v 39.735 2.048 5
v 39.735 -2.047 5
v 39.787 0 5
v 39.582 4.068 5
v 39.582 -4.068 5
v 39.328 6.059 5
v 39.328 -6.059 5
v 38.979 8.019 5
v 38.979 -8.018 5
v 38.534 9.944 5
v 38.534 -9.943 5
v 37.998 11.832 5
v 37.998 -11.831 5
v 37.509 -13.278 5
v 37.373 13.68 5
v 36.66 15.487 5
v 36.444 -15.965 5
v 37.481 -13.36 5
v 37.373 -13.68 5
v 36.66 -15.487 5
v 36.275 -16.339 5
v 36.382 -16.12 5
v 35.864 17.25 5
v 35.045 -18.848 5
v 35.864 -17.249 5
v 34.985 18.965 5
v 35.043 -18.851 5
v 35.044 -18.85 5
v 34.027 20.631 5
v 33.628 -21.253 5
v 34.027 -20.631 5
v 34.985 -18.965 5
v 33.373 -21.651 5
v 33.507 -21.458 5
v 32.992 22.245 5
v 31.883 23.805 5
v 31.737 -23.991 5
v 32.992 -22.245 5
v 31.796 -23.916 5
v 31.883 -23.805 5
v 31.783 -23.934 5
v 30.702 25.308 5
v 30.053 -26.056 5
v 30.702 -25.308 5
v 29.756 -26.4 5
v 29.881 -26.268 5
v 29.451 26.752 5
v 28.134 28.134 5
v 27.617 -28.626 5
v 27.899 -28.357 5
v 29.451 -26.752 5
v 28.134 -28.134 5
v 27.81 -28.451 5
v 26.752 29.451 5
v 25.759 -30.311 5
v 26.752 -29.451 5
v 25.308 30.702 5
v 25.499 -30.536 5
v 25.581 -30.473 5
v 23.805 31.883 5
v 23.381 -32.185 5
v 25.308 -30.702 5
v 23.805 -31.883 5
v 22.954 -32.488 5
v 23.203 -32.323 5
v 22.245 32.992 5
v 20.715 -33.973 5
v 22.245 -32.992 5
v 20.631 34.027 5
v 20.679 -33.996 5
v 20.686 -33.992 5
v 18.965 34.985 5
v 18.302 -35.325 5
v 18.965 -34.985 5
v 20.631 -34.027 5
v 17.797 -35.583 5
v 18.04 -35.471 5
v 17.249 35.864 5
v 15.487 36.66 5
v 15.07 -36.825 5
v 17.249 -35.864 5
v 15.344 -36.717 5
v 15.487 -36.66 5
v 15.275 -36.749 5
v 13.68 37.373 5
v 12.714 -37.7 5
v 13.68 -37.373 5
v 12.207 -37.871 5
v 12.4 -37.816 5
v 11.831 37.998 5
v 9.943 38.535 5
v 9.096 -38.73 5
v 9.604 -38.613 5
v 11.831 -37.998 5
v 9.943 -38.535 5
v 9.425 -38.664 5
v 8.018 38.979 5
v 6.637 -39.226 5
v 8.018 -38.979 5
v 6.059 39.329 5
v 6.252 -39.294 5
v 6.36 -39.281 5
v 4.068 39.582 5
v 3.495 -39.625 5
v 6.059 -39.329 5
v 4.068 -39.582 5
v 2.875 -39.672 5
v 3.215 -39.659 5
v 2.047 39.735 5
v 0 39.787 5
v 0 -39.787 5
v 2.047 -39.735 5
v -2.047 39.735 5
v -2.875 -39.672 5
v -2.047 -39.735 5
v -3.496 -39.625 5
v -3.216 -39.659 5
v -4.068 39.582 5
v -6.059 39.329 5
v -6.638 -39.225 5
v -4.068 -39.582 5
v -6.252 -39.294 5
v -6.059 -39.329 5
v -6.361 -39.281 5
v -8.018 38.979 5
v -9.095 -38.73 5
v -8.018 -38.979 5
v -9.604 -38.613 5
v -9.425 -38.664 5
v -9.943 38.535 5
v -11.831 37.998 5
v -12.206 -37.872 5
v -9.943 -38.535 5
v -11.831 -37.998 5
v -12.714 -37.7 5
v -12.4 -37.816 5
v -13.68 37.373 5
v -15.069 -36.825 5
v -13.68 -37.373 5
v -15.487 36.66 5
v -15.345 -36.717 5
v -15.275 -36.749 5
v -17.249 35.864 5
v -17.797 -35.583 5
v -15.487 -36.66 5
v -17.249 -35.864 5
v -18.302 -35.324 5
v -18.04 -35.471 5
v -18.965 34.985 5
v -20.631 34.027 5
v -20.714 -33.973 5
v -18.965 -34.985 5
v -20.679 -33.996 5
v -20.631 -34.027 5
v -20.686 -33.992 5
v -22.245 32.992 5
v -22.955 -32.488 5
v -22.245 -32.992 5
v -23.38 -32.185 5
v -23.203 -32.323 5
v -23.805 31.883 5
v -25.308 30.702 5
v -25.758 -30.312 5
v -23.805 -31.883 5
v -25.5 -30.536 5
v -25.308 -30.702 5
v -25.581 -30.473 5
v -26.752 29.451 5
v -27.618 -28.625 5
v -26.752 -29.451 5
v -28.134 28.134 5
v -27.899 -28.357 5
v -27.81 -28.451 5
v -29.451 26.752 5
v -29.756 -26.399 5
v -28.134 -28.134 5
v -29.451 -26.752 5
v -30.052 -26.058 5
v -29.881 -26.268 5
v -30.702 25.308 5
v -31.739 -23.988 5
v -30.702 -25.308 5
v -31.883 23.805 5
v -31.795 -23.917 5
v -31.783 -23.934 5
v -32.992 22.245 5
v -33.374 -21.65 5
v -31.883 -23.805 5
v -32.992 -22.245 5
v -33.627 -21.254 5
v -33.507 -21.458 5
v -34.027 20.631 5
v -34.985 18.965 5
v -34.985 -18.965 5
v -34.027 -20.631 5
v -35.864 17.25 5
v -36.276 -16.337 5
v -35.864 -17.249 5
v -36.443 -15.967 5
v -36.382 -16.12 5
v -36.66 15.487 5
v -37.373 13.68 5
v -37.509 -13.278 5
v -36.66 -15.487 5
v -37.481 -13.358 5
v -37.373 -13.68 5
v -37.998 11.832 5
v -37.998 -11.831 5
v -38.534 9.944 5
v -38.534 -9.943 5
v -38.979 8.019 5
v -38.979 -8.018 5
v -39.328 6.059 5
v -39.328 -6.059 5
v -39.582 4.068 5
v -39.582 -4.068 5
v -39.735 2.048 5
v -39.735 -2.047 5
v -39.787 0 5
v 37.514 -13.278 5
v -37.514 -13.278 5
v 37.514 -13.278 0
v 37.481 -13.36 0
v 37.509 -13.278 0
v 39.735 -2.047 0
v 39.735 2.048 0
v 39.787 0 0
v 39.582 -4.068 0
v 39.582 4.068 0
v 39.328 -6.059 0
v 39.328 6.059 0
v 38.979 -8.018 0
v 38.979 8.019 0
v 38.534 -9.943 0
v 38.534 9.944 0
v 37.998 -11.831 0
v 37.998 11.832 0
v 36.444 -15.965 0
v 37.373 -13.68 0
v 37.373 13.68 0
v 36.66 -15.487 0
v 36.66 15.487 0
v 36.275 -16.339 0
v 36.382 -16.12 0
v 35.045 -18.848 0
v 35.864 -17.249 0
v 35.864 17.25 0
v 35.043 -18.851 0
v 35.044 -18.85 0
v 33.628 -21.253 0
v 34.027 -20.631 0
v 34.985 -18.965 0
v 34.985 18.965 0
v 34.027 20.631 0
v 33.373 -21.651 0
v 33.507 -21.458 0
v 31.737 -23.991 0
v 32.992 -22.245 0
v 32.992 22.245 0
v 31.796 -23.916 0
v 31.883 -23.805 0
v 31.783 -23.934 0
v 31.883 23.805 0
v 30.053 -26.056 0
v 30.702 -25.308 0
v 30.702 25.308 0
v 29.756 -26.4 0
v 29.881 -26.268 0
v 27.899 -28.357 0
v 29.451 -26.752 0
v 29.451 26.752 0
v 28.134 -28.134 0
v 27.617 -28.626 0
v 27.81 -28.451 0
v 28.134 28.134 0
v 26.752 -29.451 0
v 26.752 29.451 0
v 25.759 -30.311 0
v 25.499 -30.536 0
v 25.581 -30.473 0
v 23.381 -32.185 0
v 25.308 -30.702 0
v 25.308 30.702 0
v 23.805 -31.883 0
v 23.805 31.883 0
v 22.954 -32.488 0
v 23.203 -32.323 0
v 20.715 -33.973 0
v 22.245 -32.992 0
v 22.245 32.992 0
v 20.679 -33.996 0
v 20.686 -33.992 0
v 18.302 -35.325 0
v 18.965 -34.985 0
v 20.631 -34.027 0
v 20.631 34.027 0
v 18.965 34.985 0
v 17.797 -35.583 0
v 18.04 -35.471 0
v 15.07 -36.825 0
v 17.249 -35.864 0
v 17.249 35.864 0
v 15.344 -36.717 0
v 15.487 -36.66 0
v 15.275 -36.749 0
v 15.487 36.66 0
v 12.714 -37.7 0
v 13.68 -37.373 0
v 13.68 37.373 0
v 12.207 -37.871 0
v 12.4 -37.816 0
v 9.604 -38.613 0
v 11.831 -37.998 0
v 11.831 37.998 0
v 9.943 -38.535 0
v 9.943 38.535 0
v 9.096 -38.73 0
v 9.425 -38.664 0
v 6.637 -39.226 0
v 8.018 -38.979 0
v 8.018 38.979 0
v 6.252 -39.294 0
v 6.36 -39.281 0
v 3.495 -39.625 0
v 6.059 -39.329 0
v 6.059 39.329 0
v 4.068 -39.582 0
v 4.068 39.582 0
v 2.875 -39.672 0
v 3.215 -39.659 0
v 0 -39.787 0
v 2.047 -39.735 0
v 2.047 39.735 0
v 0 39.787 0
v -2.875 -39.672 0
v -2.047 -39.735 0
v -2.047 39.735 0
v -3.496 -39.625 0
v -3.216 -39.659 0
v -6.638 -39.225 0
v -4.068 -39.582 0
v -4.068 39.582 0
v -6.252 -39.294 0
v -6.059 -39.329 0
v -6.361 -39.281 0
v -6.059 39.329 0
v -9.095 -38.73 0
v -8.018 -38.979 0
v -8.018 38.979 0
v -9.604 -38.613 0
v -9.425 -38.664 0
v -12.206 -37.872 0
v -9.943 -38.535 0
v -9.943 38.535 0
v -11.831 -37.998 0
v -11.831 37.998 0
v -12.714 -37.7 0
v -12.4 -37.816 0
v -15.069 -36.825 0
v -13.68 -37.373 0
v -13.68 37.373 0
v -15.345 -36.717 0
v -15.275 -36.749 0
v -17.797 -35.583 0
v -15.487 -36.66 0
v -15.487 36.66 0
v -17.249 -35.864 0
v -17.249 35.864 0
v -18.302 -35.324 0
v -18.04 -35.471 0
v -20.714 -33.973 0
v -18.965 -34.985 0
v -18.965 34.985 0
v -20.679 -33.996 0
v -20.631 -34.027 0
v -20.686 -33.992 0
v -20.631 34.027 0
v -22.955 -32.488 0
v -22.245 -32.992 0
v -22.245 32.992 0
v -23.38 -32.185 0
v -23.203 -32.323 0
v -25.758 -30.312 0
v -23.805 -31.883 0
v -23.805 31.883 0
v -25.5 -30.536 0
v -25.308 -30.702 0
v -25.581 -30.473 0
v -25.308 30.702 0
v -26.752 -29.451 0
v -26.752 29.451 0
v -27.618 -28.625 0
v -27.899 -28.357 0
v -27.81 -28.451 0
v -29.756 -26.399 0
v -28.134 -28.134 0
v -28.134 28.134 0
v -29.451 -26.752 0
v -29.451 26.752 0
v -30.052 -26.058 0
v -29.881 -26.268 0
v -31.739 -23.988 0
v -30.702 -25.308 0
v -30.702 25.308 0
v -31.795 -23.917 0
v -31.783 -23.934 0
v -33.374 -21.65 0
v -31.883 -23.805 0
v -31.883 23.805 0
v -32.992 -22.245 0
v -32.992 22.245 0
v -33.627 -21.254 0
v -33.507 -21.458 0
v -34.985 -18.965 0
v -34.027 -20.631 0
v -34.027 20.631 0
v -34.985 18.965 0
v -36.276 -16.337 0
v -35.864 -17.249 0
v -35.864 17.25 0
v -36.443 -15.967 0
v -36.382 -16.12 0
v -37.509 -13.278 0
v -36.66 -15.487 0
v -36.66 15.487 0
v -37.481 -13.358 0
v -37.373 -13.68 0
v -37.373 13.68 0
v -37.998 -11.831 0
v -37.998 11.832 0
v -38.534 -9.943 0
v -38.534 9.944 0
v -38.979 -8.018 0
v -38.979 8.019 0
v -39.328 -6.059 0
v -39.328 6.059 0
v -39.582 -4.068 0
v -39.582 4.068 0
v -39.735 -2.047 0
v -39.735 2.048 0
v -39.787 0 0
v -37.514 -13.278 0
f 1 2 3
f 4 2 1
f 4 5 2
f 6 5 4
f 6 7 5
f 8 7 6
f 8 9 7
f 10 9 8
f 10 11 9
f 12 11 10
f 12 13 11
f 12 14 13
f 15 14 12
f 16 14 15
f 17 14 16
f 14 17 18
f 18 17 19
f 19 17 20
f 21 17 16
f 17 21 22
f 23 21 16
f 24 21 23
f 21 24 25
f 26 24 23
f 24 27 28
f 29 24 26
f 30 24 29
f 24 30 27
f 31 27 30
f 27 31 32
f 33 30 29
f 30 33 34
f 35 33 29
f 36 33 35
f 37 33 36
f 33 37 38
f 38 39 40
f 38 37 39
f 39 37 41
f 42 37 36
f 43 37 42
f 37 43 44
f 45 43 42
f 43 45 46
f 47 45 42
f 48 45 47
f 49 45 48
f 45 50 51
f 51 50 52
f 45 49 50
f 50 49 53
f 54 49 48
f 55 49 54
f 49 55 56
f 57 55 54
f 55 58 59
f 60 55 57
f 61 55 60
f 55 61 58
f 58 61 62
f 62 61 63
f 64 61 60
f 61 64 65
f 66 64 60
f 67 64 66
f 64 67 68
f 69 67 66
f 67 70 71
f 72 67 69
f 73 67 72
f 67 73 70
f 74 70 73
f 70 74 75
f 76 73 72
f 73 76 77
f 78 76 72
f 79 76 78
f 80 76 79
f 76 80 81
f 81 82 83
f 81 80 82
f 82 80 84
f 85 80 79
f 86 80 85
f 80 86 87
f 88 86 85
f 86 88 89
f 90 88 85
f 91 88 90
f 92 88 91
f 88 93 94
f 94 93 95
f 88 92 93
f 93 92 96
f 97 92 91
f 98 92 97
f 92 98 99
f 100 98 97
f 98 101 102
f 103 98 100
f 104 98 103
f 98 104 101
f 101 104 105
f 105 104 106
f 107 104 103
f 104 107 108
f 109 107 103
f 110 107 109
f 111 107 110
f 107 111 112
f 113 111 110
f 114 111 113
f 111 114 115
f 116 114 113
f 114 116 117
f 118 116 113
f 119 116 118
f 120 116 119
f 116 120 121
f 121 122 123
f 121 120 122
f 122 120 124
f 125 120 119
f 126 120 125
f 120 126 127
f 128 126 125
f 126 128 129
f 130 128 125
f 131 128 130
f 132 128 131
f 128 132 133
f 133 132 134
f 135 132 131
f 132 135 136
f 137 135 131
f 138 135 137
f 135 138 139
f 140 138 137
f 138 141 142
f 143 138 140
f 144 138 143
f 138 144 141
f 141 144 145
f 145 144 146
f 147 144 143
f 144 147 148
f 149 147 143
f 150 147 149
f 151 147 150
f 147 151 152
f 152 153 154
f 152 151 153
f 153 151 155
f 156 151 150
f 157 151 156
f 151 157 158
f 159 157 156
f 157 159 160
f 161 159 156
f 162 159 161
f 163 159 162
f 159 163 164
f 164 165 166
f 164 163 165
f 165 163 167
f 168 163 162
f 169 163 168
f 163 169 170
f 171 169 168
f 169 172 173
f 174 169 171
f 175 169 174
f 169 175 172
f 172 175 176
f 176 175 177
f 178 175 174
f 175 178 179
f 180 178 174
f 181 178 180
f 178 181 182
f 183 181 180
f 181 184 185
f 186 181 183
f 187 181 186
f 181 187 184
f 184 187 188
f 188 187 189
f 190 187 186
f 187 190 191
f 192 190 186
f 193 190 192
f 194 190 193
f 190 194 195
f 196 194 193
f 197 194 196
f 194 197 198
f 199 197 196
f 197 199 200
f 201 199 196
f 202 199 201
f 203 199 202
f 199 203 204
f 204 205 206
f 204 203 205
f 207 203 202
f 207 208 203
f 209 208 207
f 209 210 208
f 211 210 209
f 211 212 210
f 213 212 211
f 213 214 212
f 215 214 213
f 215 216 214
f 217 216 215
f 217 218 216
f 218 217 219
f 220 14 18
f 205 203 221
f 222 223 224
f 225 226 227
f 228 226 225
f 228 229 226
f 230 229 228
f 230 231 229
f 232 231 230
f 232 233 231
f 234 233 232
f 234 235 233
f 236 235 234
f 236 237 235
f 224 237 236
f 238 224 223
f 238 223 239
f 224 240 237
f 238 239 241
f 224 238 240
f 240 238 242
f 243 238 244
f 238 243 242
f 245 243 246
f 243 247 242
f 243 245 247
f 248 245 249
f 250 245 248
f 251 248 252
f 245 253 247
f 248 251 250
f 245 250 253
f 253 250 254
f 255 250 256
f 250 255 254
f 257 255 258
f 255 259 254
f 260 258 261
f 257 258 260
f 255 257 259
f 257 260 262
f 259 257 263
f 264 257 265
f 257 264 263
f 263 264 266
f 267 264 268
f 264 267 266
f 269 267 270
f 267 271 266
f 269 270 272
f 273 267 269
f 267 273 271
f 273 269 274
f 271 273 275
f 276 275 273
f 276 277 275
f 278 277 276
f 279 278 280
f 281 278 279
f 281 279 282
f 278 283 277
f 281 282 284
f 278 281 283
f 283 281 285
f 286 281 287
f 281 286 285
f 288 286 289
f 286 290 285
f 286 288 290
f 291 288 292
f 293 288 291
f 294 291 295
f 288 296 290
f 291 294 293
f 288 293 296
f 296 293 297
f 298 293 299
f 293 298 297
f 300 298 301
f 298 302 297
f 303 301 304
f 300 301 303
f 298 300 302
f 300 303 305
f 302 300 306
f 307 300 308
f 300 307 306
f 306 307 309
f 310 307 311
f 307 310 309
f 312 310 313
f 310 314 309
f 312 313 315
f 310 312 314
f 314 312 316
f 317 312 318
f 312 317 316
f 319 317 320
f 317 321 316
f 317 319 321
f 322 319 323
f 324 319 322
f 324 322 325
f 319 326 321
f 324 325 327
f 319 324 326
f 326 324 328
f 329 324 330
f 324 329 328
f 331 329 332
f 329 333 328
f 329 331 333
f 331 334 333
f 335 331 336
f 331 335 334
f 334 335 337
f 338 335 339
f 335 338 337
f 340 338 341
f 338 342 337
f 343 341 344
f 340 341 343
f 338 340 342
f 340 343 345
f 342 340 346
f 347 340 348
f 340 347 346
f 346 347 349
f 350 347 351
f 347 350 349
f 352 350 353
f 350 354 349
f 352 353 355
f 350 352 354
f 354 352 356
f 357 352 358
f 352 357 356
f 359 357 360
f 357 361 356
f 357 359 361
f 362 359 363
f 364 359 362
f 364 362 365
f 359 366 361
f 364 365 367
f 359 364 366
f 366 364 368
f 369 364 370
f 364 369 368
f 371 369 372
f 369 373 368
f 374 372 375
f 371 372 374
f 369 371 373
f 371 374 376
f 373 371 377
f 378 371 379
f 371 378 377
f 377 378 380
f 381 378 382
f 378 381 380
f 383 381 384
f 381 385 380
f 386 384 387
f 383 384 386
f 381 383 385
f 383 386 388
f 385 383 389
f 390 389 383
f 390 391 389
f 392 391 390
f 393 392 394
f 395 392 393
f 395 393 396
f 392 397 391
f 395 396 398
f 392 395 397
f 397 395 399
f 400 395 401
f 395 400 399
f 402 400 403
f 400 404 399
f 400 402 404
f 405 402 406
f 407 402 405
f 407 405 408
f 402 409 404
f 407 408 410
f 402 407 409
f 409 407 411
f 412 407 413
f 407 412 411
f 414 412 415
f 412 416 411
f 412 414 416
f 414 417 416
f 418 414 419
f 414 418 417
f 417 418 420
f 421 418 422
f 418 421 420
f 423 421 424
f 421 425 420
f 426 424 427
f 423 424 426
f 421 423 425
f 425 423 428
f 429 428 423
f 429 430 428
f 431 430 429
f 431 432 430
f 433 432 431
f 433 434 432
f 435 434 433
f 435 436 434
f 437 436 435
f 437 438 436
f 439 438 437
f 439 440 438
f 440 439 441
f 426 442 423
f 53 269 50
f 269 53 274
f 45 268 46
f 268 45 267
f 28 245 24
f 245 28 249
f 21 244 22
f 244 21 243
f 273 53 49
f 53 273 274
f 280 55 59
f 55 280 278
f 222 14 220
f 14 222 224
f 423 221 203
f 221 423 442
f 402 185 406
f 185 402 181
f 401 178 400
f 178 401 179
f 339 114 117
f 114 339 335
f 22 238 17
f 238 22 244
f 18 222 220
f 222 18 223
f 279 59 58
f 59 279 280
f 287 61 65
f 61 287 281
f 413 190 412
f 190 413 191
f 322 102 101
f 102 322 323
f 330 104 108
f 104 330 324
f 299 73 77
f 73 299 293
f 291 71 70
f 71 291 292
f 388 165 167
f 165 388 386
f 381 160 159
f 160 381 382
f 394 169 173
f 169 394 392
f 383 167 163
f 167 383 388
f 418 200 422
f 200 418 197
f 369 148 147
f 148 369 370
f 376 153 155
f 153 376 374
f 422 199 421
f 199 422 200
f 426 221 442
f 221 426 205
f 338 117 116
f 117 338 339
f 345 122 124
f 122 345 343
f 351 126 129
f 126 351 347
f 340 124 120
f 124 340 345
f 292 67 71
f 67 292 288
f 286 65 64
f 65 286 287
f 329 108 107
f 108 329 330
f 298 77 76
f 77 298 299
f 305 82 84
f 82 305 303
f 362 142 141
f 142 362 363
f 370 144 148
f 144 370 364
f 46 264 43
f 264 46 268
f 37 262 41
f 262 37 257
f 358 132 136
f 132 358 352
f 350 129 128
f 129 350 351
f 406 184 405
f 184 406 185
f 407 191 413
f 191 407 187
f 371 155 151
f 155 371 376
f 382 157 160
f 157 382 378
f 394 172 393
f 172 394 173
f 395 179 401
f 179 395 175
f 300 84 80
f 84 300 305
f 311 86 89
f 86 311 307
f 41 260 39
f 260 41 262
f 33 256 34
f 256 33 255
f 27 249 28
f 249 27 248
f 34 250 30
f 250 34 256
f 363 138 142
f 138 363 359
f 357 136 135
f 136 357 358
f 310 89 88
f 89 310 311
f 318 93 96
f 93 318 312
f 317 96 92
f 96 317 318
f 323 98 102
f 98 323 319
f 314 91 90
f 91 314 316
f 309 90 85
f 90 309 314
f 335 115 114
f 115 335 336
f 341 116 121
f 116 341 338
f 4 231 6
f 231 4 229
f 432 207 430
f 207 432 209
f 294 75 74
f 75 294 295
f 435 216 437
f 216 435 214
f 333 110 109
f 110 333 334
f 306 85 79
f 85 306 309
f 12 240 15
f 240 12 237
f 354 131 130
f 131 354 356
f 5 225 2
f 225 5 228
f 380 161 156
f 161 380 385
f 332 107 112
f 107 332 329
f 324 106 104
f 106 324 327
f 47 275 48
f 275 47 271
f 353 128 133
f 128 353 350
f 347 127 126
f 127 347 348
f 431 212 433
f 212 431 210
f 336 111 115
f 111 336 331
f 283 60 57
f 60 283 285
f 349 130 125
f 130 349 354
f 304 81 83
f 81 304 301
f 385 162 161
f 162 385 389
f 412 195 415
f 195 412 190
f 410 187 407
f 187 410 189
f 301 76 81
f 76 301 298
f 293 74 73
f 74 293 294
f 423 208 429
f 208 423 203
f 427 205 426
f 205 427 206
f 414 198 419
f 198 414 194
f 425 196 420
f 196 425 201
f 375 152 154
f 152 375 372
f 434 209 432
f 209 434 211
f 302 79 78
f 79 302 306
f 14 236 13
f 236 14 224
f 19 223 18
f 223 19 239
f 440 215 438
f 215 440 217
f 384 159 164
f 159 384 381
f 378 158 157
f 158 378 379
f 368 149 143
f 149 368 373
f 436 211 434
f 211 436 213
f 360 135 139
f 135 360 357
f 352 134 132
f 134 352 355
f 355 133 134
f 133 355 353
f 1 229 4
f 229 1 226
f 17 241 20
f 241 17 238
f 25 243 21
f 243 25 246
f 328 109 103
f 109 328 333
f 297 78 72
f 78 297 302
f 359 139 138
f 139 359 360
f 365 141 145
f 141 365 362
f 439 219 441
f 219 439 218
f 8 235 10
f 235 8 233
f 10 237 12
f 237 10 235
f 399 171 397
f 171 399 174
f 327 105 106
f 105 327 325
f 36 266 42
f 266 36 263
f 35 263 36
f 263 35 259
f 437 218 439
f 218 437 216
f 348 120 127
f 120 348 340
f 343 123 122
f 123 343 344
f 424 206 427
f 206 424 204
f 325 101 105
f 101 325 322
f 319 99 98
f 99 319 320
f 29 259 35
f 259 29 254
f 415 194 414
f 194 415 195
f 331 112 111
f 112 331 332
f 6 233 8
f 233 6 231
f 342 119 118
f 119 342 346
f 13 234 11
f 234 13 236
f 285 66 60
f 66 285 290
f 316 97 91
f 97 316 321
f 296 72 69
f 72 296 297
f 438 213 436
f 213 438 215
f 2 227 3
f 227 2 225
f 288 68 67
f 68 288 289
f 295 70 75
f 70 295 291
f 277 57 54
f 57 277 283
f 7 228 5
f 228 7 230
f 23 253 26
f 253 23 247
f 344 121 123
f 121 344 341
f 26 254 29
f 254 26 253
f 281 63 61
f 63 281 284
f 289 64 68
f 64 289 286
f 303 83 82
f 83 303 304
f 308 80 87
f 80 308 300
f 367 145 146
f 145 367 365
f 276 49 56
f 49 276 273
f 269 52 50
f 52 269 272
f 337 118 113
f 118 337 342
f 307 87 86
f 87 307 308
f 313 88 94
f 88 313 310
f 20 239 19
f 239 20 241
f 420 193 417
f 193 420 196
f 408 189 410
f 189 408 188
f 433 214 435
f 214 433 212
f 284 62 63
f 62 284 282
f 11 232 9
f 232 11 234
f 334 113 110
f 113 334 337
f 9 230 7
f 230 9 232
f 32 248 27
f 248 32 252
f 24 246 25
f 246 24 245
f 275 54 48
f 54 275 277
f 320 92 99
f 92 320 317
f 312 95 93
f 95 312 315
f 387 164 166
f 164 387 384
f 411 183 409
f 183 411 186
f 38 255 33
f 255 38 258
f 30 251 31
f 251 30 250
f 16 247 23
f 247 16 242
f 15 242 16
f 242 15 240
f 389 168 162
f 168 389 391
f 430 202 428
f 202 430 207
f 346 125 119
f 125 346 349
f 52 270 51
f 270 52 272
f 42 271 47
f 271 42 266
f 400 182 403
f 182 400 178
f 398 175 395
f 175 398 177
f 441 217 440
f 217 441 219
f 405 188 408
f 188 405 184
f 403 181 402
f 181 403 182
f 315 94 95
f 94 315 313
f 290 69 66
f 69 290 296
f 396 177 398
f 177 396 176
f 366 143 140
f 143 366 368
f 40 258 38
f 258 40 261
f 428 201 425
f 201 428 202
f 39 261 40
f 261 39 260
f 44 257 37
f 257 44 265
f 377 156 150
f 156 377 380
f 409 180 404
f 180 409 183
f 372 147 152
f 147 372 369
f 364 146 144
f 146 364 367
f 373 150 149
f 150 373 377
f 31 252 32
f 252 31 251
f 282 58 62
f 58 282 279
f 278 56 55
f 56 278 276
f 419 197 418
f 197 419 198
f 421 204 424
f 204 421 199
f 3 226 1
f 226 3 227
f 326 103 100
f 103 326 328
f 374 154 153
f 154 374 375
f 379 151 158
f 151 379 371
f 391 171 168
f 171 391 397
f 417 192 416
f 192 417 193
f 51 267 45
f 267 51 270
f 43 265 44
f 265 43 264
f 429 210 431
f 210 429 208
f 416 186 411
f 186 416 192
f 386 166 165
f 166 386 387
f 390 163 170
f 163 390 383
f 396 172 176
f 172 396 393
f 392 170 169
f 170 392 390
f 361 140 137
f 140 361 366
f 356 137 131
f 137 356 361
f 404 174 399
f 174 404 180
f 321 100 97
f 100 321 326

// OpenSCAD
// Module names are of the form poly_<inkscape-path-id>().
// As a result you can associate a polygon in this OpenSCAD program with the
//  corresponding SVG element in the Inkscape document by looking for 
//  the XML element with the attribute id="inkscape-path-id".

// Paths have their own variables so they can be imported and used 
//  in polygon(points) structures in other programs.
// The NN_points is the list of all polygon XY vertices. 
// There may be an NN_paths variable as well. If it exists then it 
//  defines the nested paths. Both must be used in the 
//  polygon(points, paths) variant of the command.

profile_scale = 25.4/90; //made in inkscape in mm

// helper functions to determine the X,Y dimensions of the profiles
function min_x(shape_points) = min([ for (x = shape_points) min(x[0])]);
function max_x(shape_points) = max([ for (x = shape_points) max(x[0])]);
function min_y(shape_points) = min([ for (x = shape_points) min(x[1])]);
function max_y(shape_points) = max([ for (x = shape_points) max(x[1])]);

height = 5;
width = 1.0;


path59_0_points = [[84.889331,34.643066],[94.123998,34.643066],[94.123998,34.852399],[95.511289,34.554899],[96.678331,33.755399],[97.482873,32.593399],[97.782664,31.208399],[97.782664,15.949733],[97.482873,14.565295],[96.678331,13.403233],[95.511289,12.603421],[94.123998,12.305733],[92.249539,12.120025],[90.509831,11.586566],[88.940373,10.740858],[87.576664,9.618400],[86.454206,8.254691],[85.608498,6.685233],[85.075040,4.945525],[84.889331,3.071067],[84.478132,-5.247410],[83.270735,-13.339688],[81.306444,-21.165786],[78.624561,-28.685724],[75.264388,-35.859522],[71.265230,-42.647198],[66.666388,-49.008773],[61.507165,-54.904265],[55.826864,-60.293695],[49.664788,-65.137083],[43.060239,-69.394447],[36.052520,-73.025807],[28.680934,-75.991182],[20.984783,-78.250593],[13.003371,-79.764058],[4.776000,-80.491598],[-2.108000,-80.491598],[-10.411179,-79.764058],[-18.458937,-78.250593],[-26.212601,-75.991182],[-33.633499,-73.025807],[-40.682960,-69.394447],[-47.322311,-65.137083],[-53.512881,-60.293695],[-59.215999,-54.904265],[-64.392991,-49.008773],[-69.005186,-42.647198],[-73.013912,-35.859522],[-76.380498,-28.685724],[-79.066271,-21.165786],[-81.032560,-13.339688],[-82.240693,-5.247410],[-82.651998,3.071067],[-82.837706,4.945525],[-83.371165,6.685233],[-84.216873,8.254691],[-85.339331,9.618400],[-86.703039,10.740858],[-88.272498,11.586566],[-90.012206,12.120025],[-91.886664,12.305733],[-93.273748,12.603421],[-94.440331,13.403233],[-95.244414,14.565295],[-95.543998,15.949733],[-95.543998,31.208399],[-95.244414,32.593399],[-94.440331,33.755399],[-93.273748,34.554899],[-91.886664,34.852399],[-82.651998,34.852399],[84.889331,34.643066]];

module poly_path59(h, w, res=4)  {
  scale([profile_scale, -profile_scale, 1])
  union()  {
    linear_extrude(height=h)
      polygon(path59_0_points);
  }
}

path53_0_points = [[-132.921863,47.047999],[-128.913328,57.119129],[-124.169830,66.792352],[-118.726031,76.032920],[-112.616593,84.806081],[-105.876179,93.077086],[-98.539450,100.811185],[-90.641069,107.973628],[-82.215698,114.529664],[-73.297999,120.444544],[-63.922633,125.683518],[-54.124264,130.211835],[-43.937553,133.994747],[-33.397162,136.997502],[-22.537754,139.185351],[-11.393990,140.523543],[-0.000533,140.977330],[11.393158,140.523543],[22.537128,139.185351],[33.396714,136.997502],[43.937257,133.994747],[54.124097,130.211835],[63.922574,125.683518],[73.298028,120.444544],[82.215798,114.529664],[90.641224,107.973628],[98.539646,100.811185],[105.876405,93.077086],[112.616839,84.806081],[118.726289,76.032920],[124.170094,66.792352],[128.913594,57.119129],[132.922130,47.047999],[-132.921863,47.047999]];

module poly_path53(h, w, res=4)  {
  scale([profile_scale, -profile_scale, 1])
  union()  {
    linear_extrude(height=h)
      polygon(path53_0_points);
  }
}

path55_0_points = [[-4.308533,-95.515064],[6.544800,-95.515064],[6.544800,-74.424398],[-4.308533,-74.424398],[-4.308533,-95.515064]];

module poly_path55(h, w, res=4)  {
  scale([profile_scale, -profile_scale, 1])
  union()  {
    linear_extrude(height=h)
      polygon(path55_0_points);
  }
}

path69_0_points = [[-15.156533,-101.724397],[17.626133,-101.724397],[17.626133,-89.975064],[-15.156533,-89.975064],[-15.156533,-101.724397]];

module poly_path69(h, w, res=4)  {
  scale([profile_scale, -profile_scale, 1])
  union()  {
    linear_extrude(height=h)
      polygon(path69_0_points);
  }
}

path49_0_points = [[0.000000,-140.977996],[7.254707,-140.794559],[14.414174,-140.250150],[21.469542,-139.353629],[28.411955,-138.113853],[35.232554,-136.539680],[41.922482,-134.639966],[48.472882,-132.423571],[54.874894,-129.899351],[61.119663,-127.076164],[67.198330,-123.962868],[73.102037,-120.568321],[78.821928,-116.901380],[84.349143,-112.970903],[89.674826,-108.785747],[94.790119,-104.354770],[99.686164,-99.686831],[104.354104,-94.790786],[108.785080,-89.675493],[112.970236,-84.349810],[116.900713,-78.822594],[120.567654,-73.102704],[123.962202,-67.198997],[127.075498,-61.120330],[129.898684,-54.875561],[132.422904,-48.473548],[134.639300,-41.923149],[136.539013,-35.233221],[138.113187,-28.412622],[139.352963,-21.470209],[140.249484,-14.414840],[140.793892,-7.255374],[140.977330,-0.000667],[140.793892,7.254044],[140.249484,14.413522],[139.352963,21.468909],[138.113187,28.411346],[136.539013,35.231975],[134.639300,41.921939],[132.422904,48.472378],[129.898684,54.874436],[127.075498,61.119254],[123.962202,67.197973],[120.567654,73.101735],[116.900713,78.821683],[112.970236,84.348958],[108.785080,89.674702],[104.354104,94.790057],[99.686164,99.686164],[94.790119,104.354166],[89.674826,108.785205],[84.349143,112.970421],[78.821928,116.900958],[73.102037,120.567957],[67.198330,123.962559],[61.119663,127.075907],[54.874894,129.899143],[48.472882,132.423407],[41.922482,134.639843],[35.232554,136.539592],[28.411955,138.113796],[21.469542,139.353596],[14.414174,140.250135],[7.254707,140.794555],[0.000000,140.977996],[-7.254707,140.794555],[-14.414174,140.250135],[-21.469542,139.353596],[-28.411955,138.113796],[-35.232554,136.539592],[-41.922482,134.639843],[-48.472882,132.423407],[-54.874894,129.899143],[-61.119663,127.075907],[-67.198330,123.962559],[-73.102037,120.567957],[-78.821928,116.900958],[-84.349143,112.970421],[-89.674826,108.785205],[-94.790119,104.354166],[-99.686164,99.686164],[-104.354104,94.790057],[-108.785080,89.674702],[-112.970236,84.348958],[-116.900713,78.821683],[-120.567654,73.101735],[-123.962202,67.197973],[-127.075498,61.119254],[-129.898684,54.874436],[-132.422904,48.472378],[-134.639300,41.921939],[-136.539013,35.231975],[-138.113187,28.411346],[-139.352963,21.468909],[-140.249484,14.413522],[-140.793892,7.254044],[-140.977330,-0.000667],[-140.793892,-7.255374],[-140.249484,-14.414840],[-139.352963,-21.470209],[-138.113187,-28.412622],[-136.539013,-35.233221],[-134.639300,-41.923149],[-132.422904,-48.473548],[-129.898684,-54.875561],[-127.075498,-61.120330],[-123.962202,-67.198997],[-120.567654,-73.102704],[-116.900713,-78.822594],[-112.970236,-84.349810],[-108.785080,-89.675493],[-104.354104,-94.790786],[-99.686164,-99.686831],[-94.790119,-104.354770],[-89.674826,-108.785747],[-84.349143,-112.970903],[-78.821928,-116.901380],[-73.102037,-120.568321],[-67.198330,-123.962868],[-61.119663,-127.076164],[-54.874894,-129.899351],[-48.472882,-132.423571],[-41.922482,-134.639966],[-35.232554,-136.539680],[-28.411955,-138.113853],[-21.469542,-139.353629],[-14.414174,-140.250150],[-7.254707,-140.794559],[0.000000,-140.977996]];

module poly_path49(h, w, res=4)  {
  scale([profile_scale, -profile_scale, 1])
  union()  {
    linear_extrude(height=h)
      polygon(path49_0_points);
  }
}

path63_0_points = [[110.880131,47.047999],[-110.879864,47.047999],[-110.516994,43.456486],[-109.476906,40.114145],[-107.832380,37.091773],[-105.656197,34.460166],[-103.021140,32.290122],[-99.999989,30.652437],[-96.665526,29.617908],[-93.090531,29.257333],[93.089464,29.257333],[96.680977,29.617908],[100.023318,30.652437],[103.045691,32.290122],[105.677297,34.460166],[107.847342,37.091773],[109.485026,40.114145],[110.519555,43.456486],[110.880131,47.047999]];

module poly_path63(h, w, res=4)  {
  scale([profile_scale, -profile_scale, 1])
  union()  {
    linear_extrude(height=h)
      polygon(path63_0_points);
  }
}

path67_0_points = [[-85.110665,28.882666],[-85.110665,18.317333],[-73.710665,18.317333],[-73.710665,2.014667],[-56.190665,2.014667],[-56.190665,-20.743999],[-35.479999,-31.594666],[-35.479999,0.504000],[-25.365333,0.504000],[-25.365333,-5.700000],[-24.976374,-9.415104],[-23.733666,-12.459833],[-22.756609,-13.632096],[-21.523458,-14.518312],[-20.019994,-15.078997],[-18.232000,-15.274666],[-14.088000,-15.274666],[-14.088000,-29.435999],[-14.018041,-33.392707],[-13.589333,-37.244666],[-12.473625,-40.496624],[-11.555567,-41.742837],[-10.342666,-42.653332],[-9.034666,-42.946666],[-8.506562,-45.920395],[-7.117833,-48.487499],[-5.026854,-50.488853],[-2.392000,-51.765332],[-2.392000,-59.513332],[-2.117604,-60.462082],[-1.418833,-61.366332],[-0.482312,-62.043082],[0.505333,-62.309332],[1.493750,-62.043082],[2.430667,-61.366332],[3.129583,-60.462082],[3.404000,-59.513332],[3.404000,-51.634665],[5.885479,-50.316770],[7.849833,-48.344499],[9.155937,-45.857978],[9.662666,-42.997332],[11.354666,-42.653332],[12.560515,-41.791072],[13.428458,-40.567499],[14.013088,-39.050426],[14.369000,-37.307666],[14.613041,-33.416332],[14.597333,-29.435999],[14.597333,-15.141333],[22.193333,-15.224333],[29.789333,-15.005333],[29.789333,-33.606666],[59.074665,-19.249333],[59.074665,5.020000],[75.422665,5.020000],[75.422665,18.317333],[85.739998,18.317333],[85.739998,28.882666]];

module poly_path67(h, w, res=4)  {
  scale([profile_scale, -profile_scale, 1])
  union()  {
    for (t = [0: len(path67_0_points)-2]) {
      hull() {
        translate(path67_0_points[t]) 
          cylinder(h=h, r=w/2, $fn=res);
        translate(path67_0_points[t + 1]) 
          cylinder(h=h, r=w/2, $fn=res);
      }
    }
  }
}

// The shapes
poly_path59(height, width);
poly_path53(height, width);
poly_path55(height, width);
poly_path69(height, width);
poly_path49(height, width);
poly_path63(height, width);
poly_path67(height, width);
